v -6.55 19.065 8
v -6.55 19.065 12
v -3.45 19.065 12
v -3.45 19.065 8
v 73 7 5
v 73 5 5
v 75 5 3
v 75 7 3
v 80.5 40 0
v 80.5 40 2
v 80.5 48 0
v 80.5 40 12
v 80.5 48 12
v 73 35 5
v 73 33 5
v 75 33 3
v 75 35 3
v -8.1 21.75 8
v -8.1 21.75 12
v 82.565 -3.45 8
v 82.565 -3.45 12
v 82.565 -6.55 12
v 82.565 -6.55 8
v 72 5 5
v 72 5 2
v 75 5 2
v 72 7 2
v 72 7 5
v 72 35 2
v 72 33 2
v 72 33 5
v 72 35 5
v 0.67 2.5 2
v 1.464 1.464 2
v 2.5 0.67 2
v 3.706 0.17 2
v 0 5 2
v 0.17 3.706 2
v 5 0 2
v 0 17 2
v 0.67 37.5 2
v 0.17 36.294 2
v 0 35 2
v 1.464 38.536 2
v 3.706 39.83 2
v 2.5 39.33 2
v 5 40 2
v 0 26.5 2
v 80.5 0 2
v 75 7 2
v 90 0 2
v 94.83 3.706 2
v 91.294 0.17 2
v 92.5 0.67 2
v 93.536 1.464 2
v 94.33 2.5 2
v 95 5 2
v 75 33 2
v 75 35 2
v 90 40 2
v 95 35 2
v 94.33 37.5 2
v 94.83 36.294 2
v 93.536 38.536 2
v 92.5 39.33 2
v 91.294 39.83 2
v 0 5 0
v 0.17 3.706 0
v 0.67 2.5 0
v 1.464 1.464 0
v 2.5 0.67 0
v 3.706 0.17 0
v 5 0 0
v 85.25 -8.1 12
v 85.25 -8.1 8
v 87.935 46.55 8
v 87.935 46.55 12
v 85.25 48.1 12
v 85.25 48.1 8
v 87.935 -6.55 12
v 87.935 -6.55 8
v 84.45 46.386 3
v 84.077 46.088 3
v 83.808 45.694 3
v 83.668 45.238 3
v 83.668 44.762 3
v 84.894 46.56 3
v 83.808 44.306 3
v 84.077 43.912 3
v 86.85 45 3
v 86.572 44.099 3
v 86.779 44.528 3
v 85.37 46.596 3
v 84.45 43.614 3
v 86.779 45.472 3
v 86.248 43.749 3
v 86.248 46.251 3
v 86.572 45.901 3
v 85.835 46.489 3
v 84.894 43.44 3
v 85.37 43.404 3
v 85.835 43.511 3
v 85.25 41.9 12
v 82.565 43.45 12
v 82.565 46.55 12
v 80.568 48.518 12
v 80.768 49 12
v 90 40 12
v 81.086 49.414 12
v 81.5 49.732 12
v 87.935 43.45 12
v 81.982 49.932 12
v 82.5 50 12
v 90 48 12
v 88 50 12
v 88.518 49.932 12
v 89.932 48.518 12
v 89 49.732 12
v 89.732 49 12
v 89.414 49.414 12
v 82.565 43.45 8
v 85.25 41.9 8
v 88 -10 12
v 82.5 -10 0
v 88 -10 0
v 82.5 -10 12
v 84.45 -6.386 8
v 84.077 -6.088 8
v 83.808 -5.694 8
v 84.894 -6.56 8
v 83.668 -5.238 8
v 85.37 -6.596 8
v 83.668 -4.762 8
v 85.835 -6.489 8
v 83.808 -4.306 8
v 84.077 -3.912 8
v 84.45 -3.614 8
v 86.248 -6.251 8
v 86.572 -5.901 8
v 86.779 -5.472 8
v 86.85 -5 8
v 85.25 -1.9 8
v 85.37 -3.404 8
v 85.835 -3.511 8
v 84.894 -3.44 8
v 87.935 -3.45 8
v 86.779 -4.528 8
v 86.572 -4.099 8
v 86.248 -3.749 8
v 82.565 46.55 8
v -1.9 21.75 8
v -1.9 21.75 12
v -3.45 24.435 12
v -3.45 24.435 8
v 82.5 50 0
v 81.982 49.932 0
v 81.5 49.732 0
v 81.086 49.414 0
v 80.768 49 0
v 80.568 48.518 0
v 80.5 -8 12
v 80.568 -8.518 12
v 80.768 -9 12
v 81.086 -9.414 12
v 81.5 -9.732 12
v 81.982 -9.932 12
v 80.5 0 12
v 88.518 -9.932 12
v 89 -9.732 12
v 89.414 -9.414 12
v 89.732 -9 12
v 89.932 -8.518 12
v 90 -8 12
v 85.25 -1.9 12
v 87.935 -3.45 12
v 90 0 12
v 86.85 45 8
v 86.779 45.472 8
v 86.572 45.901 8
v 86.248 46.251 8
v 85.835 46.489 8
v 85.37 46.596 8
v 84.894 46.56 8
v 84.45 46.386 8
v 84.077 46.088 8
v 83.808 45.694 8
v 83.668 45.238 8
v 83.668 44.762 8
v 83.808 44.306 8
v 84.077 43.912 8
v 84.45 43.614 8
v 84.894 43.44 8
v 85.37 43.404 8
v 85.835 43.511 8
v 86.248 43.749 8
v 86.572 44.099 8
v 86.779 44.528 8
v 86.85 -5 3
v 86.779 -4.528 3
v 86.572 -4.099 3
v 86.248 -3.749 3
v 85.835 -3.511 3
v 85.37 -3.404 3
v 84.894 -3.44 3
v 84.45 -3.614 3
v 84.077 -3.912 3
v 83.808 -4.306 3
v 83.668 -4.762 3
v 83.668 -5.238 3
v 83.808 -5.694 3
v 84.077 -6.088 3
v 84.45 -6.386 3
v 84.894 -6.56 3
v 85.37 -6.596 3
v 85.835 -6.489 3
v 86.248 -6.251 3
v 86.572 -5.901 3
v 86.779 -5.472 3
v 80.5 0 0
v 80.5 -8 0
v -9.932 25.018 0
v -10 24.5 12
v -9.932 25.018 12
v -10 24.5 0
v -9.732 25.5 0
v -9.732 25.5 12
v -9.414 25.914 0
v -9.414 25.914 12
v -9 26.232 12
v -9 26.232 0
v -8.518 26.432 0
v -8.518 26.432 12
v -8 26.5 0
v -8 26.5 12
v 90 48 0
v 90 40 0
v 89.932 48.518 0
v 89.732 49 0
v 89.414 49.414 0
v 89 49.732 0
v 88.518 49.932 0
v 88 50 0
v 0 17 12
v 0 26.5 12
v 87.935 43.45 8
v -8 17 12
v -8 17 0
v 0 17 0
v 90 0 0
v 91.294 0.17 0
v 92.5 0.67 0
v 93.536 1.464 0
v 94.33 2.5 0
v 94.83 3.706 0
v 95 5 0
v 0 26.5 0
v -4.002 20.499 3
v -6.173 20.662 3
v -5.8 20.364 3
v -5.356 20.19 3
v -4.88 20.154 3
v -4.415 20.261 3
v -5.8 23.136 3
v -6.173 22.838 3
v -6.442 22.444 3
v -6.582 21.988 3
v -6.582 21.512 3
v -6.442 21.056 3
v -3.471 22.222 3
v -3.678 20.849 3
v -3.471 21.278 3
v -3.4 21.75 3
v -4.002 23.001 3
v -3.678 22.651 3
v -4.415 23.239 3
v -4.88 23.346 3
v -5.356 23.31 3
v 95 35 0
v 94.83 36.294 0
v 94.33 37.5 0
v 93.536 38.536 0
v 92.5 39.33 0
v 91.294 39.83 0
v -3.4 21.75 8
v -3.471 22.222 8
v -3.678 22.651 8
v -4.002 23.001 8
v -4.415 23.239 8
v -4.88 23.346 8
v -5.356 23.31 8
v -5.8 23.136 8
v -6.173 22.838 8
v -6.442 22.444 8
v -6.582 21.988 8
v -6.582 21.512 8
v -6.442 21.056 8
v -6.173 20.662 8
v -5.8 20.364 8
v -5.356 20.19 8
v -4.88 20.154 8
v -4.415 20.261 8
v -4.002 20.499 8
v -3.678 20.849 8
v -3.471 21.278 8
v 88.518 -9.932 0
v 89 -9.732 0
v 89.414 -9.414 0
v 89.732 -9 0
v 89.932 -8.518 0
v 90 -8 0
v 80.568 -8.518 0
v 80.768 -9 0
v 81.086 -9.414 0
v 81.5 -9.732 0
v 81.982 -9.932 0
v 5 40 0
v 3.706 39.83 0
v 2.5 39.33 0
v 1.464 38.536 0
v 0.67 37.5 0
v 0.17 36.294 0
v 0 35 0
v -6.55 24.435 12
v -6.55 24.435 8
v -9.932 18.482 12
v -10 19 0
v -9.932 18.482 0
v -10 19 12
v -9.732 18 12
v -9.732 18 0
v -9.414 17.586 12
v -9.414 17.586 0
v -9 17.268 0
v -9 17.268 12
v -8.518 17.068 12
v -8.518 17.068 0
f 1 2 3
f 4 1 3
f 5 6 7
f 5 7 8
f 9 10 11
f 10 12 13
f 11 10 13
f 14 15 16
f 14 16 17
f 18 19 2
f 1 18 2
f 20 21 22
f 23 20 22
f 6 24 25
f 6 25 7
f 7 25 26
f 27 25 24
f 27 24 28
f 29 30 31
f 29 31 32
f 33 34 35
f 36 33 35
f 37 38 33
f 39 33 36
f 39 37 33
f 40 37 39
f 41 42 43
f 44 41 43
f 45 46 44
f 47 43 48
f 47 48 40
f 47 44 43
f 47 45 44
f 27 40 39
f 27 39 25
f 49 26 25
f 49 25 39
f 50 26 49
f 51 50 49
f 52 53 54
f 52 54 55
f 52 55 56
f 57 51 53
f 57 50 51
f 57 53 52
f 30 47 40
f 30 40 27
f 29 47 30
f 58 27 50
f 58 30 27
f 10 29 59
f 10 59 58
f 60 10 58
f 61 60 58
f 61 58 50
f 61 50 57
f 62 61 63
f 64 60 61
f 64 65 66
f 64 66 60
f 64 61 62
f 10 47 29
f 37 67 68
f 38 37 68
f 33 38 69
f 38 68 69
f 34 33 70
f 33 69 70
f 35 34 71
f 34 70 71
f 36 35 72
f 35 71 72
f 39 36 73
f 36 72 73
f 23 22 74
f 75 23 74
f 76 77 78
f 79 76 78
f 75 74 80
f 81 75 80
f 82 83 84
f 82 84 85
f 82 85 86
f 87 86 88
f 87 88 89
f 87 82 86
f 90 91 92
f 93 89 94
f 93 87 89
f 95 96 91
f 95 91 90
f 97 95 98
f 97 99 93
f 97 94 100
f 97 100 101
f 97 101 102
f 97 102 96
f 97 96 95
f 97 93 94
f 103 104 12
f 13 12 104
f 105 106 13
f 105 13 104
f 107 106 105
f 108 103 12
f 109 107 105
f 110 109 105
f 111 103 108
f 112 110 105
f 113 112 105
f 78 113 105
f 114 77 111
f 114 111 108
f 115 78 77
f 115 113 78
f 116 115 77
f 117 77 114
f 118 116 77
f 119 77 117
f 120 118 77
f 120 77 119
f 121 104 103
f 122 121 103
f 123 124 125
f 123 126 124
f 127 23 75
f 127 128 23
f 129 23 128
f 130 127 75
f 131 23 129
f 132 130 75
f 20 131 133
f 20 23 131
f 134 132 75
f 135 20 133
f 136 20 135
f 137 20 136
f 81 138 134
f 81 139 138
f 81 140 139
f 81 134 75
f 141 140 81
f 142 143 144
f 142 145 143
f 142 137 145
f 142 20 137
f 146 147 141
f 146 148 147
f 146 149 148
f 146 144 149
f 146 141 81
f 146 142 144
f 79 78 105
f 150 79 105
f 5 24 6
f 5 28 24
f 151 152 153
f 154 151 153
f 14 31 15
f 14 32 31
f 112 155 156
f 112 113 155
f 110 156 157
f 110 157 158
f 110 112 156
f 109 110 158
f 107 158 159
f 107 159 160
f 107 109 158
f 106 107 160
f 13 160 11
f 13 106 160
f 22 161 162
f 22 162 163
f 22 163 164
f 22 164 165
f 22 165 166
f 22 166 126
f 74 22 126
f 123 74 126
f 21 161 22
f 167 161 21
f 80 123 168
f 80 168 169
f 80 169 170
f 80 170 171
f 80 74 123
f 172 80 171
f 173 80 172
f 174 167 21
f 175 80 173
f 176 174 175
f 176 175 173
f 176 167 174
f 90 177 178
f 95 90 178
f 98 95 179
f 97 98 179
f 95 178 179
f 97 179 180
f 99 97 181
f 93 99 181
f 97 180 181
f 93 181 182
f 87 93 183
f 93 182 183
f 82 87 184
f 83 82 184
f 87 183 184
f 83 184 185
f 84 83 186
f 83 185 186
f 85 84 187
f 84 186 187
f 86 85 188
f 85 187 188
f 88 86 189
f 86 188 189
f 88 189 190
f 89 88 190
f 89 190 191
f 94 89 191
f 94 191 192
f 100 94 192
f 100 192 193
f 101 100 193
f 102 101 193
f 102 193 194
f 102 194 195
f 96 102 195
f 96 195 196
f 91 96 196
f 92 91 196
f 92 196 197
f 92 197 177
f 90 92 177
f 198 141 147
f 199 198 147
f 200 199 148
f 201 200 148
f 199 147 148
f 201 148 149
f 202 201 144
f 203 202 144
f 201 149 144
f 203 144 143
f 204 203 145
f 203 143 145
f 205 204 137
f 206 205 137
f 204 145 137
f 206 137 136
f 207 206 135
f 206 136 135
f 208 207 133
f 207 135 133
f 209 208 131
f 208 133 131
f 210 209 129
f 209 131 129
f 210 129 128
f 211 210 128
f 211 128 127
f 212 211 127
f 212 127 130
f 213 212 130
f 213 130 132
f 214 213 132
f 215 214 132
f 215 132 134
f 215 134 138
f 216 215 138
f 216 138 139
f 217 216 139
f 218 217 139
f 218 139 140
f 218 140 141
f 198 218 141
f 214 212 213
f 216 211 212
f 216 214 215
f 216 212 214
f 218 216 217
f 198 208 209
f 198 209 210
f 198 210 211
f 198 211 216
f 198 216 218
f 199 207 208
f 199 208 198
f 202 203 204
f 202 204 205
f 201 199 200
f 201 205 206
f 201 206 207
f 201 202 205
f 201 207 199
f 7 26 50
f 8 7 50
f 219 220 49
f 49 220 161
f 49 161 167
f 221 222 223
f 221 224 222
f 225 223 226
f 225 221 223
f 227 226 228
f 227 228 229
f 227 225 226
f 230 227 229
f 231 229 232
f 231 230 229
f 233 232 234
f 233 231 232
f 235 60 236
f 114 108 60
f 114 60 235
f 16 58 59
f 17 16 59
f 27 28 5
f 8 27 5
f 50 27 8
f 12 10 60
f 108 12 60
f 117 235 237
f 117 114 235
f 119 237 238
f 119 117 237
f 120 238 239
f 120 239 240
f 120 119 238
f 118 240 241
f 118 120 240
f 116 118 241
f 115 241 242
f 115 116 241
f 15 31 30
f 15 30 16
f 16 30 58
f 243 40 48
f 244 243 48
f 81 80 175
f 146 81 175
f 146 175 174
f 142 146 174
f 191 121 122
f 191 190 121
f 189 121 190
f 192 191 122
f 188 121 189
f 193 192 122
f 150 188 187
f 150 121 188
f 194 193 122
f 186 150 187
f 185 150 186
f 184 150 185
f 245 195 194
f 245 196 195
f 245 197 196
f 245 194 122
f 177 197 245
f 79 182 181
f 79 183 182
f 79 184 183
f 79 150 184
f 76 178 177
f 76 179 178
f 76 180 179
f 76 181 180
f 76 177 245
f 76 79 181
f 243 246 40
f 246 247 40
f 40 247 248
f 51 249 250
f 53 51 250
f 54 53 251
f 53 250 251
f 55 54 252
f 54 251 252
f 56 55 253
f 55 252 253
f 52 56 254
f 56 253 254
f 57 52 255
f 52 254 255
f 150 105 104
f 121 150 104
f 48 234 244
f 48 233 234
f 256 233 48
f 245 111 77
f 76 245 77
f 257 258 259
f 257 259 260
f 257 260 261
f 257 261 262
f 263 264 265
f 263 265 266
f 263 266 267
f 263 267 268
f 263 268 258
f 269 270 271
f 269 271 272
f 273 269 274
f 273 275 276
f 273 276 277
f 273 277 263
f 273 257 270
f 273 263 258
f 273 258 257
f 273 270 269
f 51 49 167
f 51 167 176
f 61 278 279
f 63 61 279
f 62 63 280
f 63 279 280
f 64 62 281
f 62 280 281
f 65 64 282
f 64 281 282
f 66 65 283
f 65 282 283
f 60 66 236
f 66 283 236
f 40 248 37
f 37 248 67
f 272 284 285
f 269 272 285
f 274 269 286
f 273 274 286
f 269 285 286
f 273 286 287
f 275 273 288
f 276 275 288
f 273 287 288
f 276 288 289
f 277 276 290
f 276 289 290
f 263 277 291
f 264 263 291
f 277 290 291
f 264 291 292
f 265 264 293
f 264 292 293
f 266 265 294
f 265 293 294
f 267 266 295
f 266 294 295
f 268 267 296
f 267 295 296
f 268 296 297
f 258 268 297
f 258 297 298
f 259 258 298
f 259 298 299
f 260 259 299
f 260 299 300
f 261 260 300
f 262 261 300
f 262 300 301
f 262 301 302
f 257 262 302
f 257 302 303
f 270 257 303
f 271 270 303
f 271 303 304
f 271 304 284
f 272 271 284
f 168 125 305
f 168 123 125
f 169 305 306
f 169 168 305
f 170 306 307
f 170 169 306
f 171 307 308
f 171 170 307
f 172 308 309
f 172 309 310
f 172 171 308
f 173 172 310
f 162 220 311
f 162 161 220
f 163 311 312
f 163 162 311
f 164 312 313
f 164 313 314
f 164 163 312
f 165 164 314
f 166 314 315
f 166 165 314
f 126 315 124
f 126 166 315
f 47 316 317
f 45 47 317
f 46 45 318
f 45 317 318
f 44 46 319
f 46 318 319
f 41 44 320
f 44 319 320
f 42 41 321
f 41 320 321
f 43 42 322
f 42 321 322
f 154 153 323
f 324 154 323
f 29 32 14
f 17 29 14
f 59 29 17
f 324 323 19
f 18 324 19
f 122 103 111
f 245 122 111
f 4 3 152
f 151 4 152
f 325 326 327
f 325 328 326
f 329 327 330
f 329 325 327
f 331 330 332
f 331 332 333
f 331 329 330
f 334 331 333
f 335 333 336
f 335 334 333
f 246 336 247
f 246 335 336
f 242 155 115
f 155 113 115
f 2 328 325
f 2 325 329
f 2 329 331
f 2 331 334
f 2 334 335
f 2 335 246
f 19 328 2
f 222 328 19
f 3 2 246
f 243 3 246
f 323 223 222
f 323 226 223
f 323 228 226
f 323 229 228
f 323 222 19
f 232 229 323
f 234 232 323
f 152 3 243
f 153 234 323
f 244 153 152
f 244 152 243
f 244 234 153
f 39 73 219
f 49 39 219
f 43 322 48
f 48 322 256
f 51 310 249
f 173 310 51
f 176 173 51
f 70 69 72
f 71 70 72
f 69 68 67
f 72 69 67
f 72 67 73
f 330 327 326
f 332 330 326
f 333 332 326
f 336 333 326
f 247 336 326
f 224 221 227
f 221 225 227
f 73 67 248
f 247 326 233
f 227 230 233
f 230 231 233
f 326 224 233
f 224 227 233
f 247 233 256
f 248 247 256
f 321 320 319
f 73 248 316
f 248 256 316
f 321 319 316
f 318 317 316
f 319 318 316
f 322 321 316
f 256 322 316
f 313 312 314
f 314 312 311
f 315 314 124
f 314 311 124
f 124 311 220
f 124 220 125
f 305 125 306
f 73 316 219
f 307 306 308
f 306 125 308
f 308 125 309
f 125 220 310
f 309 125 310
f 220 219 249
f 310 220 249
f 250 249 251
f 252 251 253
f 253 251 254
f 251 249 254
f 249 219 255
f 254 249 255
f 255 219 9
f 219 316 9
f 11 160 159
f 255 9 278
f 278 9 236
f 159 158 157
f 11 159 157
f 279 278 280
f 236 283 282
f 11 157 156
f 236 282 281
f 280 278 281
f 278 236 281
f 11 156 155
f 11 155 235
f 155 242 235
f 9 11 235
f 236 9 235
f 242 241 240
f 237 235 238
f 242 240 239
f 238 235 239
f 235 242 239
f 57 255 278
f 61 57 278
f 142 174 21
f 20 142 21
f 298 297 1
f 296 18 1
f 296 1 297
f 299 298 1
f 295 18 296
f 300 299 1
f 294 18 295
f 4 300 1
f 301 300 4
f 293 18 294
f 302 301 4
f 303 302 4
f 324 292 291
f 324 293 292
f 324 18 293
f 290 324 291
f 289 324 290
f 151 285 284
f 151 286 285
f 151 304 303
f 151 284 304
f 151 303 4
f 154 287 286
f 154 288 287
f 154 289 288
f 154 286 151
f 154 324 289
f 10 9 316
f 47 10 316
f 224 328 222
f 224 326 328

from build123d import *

# Parameters (mm, degrees)
PAD_DEPTH       = 2
SKETCH017_W     = 10
SKETCH017_H     = 9.5
SKETCH017_W_2   = 9.5
SKETCH017_H_2   = 10
PAD006_DEPTH    = 2
SKETCH018_W     = 10
SKETCH018_H     = 9.5
SKETCH018_W_2   = 9.5
SKETCH018_H_2   = 10
PAD007_DEPTH    = 10
SKETCH020_R     = 1.6
POCKET008_DEPTH = 9
POCKET011_DEPTH = 4
FILLET002_R     = 2
SKETCH028_W     = 3
SKETCH028_H     = 2
PAD010_DEPTH    = 3
CHAMFER_SIZE    = 2


with BuildPart() as part:
    # Sketch → Pad (new body)
    with BuildSketch(Plane.XY):
        with BuildLine():
            Line((5, 0), (90, 0))
            ThreePointArc((90, 0), (93.5355339059, 1.4644660941), (95, 5))
            Line((95, 5), (95, 35))
            ThreePointArc((95, 35), (93.5355339059, 38.5355339059), (90, 40))
            Line((90, 40), (5, 40))
            ThreePointArc((5, 40), (1.4644660941, 38.5355339059), (0, 35))
            Line((0, 35), (0, 5))
            ThreePointArc((0, 5), (1.4644660941, 1.4644660941), (5, 0))
        make_face()
    extrude(amount=PAD_DEPTH)

    # Sketch017 (on Face10 of Pad) → Pad006 (join)
    with BuildSketch(Plane.XY.offset(2)):
        with Locations((-5, 21.75)):
            Rectangle(SKETCH017_W, SKETCH017_H)
        with Locations((85.25, -5)):
            Rectangle(SKETCH017_W_2, SKETCH017_H_2)
        with Locations((85.25, 45)):
            Rectangle(SKETCH017_W_2, SKETCH017_H_2)
    extrude(amount=-PAD006_DEPTH)

    # Sketch018 (on Face18 of Pad006) → Pad007 (join)
    with BuildSketch(Plane.XY.offset(2)):
        with Locations((-5, 21.75)):
            Rectangle(SKETCH018_W, SKETCH018_H)
        with Locations((85.25, -5)):
            Rectangle(SKETCH018_W_2, SKETCH018_H_2)
        with Locations((85.25, 45)):
            Rectangle(SKETCH018_W_2, SKETCH018_H_2)
    extrude(amount=PAD007_DEPTH)

    # Sketch020 (on Face29 of Pad007) → Pocket008 (cut)
    with BuildSketch(Plane.XY.offset(12)):
        with Locations((85.25, -5)):
            Circle(SKETCH020_R)
        with Locations((85.25, 45)):
            Circle(SKETCH020_R)
        with Locations((-5, 21.75)):
            Circle(SKETCH020_R)
    extrude(amount=-POCKET008_DEPTH, mode=Mode.SUBTRACT)

    # Sketch021 (on Face29 of Pocket008) → Pocket011 (cut)
    with BuildSketch(Plane.XY.offset(12)):
        Polygon((87.9346787517, 43.45), (87.9346787517, 46.55), (85.25, 48.1), (82.5653212483, 46.55), (82.5653212483, 43.45), (85.25, 41.9), align=None)
        Polygon((87.9346787517, -6.55), (87.9346787517, -3.45), (85.25, -1.9), (82.5653212483, -3.45), (82.5653212483, -6.55), (85.25, -8.1), align=None)
        Polygon((-3.45, 19.0653212483), (-1.9, 21.75), (-3.45, 24.4346787517), (-6.55, 24.4346787517), (-8.1, 21.75), (-6.55, 19.0653212483), align=None)
    extrude(amount=-POCKET011_DEPTH, mode=Mode.SUBTRACT)

    # Fillet002
    fillet002_edges = [part.edges().sort_by_distance(p)[0] for p in [
        (-10, 17, 7),
        (-10, 26.5, 7),
        (80.5, 50, 7),
        (90, 50, 7),
        (80.5, -10, 7),
        (90, -10, 7),
    ]]
    fillet(fillet002_edges, radius=FILLET002_R)

    # Sketch028 (on Face12 of Fillet002) → Pad010 (join)
    with BuildSketch(Plane.XY.offset(2)):
        with Locations((73.5, 34)):
            Rectangle(SKETCH028_W, SKETCH028_H)
        with Locations((73.5, 6)):
            Rectangle(SKETCH028_W, SKETCH028_H)
    extrude(amount=PAD010_DEPTH)

    # Chamfer
    chamfer_edges = [part.edges().sort_by_distance(p)[0] for p in [
        (75, 6, 5),
        (75, 34, 5),
    ]]
    chamfer(chamfer_edges, length=CHAMFER_SIZE)


solid = part.part
